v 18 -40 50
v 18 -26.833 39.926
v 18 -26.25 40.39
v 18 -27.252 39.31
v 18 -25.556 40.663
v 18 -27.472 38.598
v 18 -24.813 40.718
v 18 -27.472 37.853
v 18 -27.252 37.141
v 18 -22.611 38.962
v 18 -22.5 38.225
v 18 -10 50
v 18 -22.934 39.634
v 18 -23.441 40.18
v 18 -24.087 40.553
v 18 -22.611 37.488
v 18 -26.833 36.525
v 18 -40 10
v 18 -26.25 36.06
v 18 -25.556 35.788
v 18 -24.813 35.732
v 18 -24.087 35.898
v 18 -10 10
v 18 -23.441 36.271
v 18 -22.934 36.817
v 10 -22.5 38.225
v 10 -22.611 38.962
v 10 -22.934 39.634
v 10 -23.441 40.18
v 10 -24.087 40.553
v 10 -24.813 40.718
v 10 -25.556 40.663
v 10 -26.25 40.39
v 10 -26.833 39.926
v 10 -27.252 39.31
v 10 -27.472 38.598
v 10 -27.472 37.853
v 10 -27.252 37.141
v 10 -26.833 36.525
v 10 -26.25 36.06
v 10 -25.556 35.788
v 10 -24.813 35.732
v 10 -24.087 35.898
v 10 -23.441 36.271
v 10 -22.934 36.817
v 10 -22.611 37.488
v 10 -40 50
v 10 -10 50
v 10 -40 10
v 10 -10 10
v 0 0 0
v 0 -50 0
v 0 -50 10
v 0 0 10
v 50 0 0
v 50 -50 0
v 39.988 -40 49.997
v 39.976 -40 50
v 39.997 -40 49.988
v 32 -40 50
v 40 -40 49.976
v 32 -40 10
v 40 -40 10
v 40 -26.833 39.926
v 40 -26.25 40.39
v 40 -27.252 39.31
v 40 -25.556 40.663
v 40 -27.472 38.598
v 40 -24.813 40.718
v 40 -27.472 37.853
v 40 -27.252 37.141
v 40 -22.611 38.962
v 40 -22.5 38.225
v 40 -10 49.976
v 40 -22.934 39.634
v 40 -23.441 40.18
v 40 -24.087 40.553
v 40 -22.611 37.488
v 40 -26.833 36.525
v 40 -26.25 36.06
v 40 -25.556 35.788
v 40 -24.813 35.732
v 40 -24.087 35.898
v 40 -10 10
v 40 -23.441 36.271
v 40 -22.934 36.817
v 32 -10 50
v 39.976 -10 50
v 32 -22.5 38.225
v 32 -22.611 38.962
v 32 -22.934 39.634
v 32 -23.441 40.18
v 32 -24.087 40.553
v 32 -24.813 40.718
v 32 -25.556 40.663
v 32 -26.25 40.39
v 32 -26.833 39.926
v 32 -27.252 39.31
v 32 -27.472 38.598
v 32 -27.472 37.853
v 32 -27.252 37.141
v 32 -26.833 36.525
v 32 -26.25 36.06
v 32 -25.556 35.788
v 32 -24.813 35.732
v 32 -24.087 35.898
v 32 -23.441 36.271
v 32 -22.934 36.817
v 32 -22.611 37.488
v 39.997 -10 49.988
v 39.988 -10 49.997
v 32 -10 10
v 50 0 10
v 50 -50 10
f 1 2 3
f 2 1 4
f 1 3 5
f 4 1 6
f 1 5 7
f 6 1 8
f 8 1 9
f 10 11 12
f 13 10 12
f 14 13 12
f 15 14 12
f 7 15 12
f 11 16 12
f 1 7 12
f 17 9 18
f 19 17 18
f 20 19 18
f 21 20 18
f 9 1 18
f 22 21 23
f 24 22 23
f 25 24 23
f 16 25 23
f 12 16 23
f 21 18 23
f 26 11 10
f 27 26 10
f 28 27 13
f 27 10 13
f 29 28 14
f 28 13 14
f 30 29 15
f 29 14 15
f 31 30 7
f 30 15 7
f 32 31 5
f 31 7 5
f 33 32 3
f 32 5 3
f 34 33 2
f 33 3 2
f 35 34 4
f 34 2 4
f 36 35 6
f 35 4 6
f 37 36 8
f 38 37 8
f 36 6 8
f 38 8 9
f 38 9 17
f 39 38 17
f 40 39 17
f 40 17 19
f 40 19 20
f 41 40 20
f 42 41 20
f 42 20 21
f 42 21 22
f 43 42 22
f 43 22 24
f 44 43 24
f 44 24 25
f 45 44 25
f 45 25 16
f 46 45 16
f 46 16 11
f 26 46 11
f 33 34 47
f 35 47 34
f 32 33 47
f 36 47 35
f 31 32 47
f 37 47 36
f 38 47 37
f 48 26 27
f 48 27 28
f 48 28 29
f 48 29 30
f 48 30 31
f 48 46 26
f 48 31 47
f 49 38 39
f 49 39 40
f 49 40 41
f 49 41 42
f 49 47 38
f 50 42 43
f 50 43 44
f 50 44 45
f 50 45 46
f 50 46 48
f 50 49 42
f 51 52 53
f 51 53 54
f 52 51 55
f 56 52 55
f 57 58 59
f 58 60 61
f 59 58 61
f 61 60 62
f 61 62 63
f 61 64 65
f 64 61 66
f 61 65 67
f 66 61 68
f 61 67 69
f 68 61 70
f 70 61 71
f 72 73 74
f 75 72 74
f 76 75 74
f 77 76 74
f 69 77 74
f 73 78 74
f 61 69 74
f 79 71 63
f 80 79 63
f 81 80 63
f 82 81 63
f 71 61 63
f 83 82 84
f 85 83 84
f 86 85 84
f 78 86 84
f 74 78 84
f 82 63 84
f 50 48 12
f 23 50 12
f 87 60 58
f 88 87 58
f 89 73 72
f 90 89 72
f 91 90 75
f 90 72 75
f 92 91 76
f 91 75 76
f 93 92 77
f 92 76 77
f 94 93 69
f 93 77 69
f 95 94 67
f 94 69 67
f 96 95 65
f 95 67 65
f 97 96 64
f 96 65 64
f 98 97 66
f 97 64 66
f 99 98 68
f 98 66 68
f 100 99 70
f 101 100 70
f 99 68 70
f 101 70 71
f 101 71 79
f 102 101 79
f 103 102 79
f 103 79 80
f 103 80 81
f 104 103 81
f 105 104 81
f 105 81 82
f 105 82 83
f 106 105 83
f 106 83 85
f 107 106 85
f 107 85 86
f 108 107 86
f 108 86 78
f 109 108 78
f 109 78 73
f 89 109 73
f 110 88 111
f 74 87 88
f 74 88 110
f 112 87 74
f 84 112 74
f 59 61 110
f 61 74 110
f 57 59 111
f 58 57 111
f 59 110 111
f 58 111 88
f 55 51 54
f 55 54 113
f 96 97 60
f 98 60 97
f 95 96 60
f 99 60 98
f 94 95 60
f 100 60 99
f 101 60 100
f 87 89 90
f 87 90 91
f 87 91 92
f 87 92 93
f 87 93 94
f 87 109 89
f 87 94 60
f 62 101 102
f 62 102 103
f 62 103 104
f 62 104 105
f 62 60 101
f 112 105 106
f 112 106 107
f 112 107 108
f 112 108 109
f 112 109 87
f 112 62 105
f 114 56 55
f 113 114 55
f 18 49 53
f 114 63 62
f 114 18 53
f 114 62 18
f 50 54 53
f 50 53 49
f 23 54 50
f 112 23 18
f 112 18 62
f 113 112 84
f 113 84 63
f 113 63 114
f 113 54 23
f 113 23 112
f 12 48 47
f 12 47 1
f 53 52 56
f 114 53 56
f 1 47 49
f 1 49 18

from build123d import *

# Parameters (mm, degrees)
F0_W     = 50
F0_H     = 50
F1_DEPTH = 10
F2_W     = 8
F2_H     = 30
F3_DEPTH = 40
F5_D     = 5
F6_R     = 0.024142


with BuildPart() as f1:
    # F0 (on Top) → F1 (new body)
    with BuildSketch(Plane.XY):
        with Locations((25, -25)):
            Rectangle(F0_W, F0_H)
    extrude(amount=F1_DEPTH)

    # F2 (on face) → F3 (join)
    with BuildSketch(Plane.XY.offset(10)):
        with Locations((14, -25)):
            Rectangle(F2_W, F2_H)
        with Locations((36, -25)):
            Rectangle(F2_W, F2_H)
    extrude(amount=F3_DEPTH)

    # F5 (through all)
    with Locations(Plane(origin=(10, 0, 0), x_dir=(0, -1, 0), z_dir=(-1, 0, 0))):
        with Locations((25, 38.225368)):
            Hole(F5_D / 2)

    # F6
    f6_edges = [f1.edges().sort_by_distance(p)[0] for p in [
        (40, -25, 50),
    ]]
    fillet(f6_edges, radius=F6_R)


solid = f1.part
